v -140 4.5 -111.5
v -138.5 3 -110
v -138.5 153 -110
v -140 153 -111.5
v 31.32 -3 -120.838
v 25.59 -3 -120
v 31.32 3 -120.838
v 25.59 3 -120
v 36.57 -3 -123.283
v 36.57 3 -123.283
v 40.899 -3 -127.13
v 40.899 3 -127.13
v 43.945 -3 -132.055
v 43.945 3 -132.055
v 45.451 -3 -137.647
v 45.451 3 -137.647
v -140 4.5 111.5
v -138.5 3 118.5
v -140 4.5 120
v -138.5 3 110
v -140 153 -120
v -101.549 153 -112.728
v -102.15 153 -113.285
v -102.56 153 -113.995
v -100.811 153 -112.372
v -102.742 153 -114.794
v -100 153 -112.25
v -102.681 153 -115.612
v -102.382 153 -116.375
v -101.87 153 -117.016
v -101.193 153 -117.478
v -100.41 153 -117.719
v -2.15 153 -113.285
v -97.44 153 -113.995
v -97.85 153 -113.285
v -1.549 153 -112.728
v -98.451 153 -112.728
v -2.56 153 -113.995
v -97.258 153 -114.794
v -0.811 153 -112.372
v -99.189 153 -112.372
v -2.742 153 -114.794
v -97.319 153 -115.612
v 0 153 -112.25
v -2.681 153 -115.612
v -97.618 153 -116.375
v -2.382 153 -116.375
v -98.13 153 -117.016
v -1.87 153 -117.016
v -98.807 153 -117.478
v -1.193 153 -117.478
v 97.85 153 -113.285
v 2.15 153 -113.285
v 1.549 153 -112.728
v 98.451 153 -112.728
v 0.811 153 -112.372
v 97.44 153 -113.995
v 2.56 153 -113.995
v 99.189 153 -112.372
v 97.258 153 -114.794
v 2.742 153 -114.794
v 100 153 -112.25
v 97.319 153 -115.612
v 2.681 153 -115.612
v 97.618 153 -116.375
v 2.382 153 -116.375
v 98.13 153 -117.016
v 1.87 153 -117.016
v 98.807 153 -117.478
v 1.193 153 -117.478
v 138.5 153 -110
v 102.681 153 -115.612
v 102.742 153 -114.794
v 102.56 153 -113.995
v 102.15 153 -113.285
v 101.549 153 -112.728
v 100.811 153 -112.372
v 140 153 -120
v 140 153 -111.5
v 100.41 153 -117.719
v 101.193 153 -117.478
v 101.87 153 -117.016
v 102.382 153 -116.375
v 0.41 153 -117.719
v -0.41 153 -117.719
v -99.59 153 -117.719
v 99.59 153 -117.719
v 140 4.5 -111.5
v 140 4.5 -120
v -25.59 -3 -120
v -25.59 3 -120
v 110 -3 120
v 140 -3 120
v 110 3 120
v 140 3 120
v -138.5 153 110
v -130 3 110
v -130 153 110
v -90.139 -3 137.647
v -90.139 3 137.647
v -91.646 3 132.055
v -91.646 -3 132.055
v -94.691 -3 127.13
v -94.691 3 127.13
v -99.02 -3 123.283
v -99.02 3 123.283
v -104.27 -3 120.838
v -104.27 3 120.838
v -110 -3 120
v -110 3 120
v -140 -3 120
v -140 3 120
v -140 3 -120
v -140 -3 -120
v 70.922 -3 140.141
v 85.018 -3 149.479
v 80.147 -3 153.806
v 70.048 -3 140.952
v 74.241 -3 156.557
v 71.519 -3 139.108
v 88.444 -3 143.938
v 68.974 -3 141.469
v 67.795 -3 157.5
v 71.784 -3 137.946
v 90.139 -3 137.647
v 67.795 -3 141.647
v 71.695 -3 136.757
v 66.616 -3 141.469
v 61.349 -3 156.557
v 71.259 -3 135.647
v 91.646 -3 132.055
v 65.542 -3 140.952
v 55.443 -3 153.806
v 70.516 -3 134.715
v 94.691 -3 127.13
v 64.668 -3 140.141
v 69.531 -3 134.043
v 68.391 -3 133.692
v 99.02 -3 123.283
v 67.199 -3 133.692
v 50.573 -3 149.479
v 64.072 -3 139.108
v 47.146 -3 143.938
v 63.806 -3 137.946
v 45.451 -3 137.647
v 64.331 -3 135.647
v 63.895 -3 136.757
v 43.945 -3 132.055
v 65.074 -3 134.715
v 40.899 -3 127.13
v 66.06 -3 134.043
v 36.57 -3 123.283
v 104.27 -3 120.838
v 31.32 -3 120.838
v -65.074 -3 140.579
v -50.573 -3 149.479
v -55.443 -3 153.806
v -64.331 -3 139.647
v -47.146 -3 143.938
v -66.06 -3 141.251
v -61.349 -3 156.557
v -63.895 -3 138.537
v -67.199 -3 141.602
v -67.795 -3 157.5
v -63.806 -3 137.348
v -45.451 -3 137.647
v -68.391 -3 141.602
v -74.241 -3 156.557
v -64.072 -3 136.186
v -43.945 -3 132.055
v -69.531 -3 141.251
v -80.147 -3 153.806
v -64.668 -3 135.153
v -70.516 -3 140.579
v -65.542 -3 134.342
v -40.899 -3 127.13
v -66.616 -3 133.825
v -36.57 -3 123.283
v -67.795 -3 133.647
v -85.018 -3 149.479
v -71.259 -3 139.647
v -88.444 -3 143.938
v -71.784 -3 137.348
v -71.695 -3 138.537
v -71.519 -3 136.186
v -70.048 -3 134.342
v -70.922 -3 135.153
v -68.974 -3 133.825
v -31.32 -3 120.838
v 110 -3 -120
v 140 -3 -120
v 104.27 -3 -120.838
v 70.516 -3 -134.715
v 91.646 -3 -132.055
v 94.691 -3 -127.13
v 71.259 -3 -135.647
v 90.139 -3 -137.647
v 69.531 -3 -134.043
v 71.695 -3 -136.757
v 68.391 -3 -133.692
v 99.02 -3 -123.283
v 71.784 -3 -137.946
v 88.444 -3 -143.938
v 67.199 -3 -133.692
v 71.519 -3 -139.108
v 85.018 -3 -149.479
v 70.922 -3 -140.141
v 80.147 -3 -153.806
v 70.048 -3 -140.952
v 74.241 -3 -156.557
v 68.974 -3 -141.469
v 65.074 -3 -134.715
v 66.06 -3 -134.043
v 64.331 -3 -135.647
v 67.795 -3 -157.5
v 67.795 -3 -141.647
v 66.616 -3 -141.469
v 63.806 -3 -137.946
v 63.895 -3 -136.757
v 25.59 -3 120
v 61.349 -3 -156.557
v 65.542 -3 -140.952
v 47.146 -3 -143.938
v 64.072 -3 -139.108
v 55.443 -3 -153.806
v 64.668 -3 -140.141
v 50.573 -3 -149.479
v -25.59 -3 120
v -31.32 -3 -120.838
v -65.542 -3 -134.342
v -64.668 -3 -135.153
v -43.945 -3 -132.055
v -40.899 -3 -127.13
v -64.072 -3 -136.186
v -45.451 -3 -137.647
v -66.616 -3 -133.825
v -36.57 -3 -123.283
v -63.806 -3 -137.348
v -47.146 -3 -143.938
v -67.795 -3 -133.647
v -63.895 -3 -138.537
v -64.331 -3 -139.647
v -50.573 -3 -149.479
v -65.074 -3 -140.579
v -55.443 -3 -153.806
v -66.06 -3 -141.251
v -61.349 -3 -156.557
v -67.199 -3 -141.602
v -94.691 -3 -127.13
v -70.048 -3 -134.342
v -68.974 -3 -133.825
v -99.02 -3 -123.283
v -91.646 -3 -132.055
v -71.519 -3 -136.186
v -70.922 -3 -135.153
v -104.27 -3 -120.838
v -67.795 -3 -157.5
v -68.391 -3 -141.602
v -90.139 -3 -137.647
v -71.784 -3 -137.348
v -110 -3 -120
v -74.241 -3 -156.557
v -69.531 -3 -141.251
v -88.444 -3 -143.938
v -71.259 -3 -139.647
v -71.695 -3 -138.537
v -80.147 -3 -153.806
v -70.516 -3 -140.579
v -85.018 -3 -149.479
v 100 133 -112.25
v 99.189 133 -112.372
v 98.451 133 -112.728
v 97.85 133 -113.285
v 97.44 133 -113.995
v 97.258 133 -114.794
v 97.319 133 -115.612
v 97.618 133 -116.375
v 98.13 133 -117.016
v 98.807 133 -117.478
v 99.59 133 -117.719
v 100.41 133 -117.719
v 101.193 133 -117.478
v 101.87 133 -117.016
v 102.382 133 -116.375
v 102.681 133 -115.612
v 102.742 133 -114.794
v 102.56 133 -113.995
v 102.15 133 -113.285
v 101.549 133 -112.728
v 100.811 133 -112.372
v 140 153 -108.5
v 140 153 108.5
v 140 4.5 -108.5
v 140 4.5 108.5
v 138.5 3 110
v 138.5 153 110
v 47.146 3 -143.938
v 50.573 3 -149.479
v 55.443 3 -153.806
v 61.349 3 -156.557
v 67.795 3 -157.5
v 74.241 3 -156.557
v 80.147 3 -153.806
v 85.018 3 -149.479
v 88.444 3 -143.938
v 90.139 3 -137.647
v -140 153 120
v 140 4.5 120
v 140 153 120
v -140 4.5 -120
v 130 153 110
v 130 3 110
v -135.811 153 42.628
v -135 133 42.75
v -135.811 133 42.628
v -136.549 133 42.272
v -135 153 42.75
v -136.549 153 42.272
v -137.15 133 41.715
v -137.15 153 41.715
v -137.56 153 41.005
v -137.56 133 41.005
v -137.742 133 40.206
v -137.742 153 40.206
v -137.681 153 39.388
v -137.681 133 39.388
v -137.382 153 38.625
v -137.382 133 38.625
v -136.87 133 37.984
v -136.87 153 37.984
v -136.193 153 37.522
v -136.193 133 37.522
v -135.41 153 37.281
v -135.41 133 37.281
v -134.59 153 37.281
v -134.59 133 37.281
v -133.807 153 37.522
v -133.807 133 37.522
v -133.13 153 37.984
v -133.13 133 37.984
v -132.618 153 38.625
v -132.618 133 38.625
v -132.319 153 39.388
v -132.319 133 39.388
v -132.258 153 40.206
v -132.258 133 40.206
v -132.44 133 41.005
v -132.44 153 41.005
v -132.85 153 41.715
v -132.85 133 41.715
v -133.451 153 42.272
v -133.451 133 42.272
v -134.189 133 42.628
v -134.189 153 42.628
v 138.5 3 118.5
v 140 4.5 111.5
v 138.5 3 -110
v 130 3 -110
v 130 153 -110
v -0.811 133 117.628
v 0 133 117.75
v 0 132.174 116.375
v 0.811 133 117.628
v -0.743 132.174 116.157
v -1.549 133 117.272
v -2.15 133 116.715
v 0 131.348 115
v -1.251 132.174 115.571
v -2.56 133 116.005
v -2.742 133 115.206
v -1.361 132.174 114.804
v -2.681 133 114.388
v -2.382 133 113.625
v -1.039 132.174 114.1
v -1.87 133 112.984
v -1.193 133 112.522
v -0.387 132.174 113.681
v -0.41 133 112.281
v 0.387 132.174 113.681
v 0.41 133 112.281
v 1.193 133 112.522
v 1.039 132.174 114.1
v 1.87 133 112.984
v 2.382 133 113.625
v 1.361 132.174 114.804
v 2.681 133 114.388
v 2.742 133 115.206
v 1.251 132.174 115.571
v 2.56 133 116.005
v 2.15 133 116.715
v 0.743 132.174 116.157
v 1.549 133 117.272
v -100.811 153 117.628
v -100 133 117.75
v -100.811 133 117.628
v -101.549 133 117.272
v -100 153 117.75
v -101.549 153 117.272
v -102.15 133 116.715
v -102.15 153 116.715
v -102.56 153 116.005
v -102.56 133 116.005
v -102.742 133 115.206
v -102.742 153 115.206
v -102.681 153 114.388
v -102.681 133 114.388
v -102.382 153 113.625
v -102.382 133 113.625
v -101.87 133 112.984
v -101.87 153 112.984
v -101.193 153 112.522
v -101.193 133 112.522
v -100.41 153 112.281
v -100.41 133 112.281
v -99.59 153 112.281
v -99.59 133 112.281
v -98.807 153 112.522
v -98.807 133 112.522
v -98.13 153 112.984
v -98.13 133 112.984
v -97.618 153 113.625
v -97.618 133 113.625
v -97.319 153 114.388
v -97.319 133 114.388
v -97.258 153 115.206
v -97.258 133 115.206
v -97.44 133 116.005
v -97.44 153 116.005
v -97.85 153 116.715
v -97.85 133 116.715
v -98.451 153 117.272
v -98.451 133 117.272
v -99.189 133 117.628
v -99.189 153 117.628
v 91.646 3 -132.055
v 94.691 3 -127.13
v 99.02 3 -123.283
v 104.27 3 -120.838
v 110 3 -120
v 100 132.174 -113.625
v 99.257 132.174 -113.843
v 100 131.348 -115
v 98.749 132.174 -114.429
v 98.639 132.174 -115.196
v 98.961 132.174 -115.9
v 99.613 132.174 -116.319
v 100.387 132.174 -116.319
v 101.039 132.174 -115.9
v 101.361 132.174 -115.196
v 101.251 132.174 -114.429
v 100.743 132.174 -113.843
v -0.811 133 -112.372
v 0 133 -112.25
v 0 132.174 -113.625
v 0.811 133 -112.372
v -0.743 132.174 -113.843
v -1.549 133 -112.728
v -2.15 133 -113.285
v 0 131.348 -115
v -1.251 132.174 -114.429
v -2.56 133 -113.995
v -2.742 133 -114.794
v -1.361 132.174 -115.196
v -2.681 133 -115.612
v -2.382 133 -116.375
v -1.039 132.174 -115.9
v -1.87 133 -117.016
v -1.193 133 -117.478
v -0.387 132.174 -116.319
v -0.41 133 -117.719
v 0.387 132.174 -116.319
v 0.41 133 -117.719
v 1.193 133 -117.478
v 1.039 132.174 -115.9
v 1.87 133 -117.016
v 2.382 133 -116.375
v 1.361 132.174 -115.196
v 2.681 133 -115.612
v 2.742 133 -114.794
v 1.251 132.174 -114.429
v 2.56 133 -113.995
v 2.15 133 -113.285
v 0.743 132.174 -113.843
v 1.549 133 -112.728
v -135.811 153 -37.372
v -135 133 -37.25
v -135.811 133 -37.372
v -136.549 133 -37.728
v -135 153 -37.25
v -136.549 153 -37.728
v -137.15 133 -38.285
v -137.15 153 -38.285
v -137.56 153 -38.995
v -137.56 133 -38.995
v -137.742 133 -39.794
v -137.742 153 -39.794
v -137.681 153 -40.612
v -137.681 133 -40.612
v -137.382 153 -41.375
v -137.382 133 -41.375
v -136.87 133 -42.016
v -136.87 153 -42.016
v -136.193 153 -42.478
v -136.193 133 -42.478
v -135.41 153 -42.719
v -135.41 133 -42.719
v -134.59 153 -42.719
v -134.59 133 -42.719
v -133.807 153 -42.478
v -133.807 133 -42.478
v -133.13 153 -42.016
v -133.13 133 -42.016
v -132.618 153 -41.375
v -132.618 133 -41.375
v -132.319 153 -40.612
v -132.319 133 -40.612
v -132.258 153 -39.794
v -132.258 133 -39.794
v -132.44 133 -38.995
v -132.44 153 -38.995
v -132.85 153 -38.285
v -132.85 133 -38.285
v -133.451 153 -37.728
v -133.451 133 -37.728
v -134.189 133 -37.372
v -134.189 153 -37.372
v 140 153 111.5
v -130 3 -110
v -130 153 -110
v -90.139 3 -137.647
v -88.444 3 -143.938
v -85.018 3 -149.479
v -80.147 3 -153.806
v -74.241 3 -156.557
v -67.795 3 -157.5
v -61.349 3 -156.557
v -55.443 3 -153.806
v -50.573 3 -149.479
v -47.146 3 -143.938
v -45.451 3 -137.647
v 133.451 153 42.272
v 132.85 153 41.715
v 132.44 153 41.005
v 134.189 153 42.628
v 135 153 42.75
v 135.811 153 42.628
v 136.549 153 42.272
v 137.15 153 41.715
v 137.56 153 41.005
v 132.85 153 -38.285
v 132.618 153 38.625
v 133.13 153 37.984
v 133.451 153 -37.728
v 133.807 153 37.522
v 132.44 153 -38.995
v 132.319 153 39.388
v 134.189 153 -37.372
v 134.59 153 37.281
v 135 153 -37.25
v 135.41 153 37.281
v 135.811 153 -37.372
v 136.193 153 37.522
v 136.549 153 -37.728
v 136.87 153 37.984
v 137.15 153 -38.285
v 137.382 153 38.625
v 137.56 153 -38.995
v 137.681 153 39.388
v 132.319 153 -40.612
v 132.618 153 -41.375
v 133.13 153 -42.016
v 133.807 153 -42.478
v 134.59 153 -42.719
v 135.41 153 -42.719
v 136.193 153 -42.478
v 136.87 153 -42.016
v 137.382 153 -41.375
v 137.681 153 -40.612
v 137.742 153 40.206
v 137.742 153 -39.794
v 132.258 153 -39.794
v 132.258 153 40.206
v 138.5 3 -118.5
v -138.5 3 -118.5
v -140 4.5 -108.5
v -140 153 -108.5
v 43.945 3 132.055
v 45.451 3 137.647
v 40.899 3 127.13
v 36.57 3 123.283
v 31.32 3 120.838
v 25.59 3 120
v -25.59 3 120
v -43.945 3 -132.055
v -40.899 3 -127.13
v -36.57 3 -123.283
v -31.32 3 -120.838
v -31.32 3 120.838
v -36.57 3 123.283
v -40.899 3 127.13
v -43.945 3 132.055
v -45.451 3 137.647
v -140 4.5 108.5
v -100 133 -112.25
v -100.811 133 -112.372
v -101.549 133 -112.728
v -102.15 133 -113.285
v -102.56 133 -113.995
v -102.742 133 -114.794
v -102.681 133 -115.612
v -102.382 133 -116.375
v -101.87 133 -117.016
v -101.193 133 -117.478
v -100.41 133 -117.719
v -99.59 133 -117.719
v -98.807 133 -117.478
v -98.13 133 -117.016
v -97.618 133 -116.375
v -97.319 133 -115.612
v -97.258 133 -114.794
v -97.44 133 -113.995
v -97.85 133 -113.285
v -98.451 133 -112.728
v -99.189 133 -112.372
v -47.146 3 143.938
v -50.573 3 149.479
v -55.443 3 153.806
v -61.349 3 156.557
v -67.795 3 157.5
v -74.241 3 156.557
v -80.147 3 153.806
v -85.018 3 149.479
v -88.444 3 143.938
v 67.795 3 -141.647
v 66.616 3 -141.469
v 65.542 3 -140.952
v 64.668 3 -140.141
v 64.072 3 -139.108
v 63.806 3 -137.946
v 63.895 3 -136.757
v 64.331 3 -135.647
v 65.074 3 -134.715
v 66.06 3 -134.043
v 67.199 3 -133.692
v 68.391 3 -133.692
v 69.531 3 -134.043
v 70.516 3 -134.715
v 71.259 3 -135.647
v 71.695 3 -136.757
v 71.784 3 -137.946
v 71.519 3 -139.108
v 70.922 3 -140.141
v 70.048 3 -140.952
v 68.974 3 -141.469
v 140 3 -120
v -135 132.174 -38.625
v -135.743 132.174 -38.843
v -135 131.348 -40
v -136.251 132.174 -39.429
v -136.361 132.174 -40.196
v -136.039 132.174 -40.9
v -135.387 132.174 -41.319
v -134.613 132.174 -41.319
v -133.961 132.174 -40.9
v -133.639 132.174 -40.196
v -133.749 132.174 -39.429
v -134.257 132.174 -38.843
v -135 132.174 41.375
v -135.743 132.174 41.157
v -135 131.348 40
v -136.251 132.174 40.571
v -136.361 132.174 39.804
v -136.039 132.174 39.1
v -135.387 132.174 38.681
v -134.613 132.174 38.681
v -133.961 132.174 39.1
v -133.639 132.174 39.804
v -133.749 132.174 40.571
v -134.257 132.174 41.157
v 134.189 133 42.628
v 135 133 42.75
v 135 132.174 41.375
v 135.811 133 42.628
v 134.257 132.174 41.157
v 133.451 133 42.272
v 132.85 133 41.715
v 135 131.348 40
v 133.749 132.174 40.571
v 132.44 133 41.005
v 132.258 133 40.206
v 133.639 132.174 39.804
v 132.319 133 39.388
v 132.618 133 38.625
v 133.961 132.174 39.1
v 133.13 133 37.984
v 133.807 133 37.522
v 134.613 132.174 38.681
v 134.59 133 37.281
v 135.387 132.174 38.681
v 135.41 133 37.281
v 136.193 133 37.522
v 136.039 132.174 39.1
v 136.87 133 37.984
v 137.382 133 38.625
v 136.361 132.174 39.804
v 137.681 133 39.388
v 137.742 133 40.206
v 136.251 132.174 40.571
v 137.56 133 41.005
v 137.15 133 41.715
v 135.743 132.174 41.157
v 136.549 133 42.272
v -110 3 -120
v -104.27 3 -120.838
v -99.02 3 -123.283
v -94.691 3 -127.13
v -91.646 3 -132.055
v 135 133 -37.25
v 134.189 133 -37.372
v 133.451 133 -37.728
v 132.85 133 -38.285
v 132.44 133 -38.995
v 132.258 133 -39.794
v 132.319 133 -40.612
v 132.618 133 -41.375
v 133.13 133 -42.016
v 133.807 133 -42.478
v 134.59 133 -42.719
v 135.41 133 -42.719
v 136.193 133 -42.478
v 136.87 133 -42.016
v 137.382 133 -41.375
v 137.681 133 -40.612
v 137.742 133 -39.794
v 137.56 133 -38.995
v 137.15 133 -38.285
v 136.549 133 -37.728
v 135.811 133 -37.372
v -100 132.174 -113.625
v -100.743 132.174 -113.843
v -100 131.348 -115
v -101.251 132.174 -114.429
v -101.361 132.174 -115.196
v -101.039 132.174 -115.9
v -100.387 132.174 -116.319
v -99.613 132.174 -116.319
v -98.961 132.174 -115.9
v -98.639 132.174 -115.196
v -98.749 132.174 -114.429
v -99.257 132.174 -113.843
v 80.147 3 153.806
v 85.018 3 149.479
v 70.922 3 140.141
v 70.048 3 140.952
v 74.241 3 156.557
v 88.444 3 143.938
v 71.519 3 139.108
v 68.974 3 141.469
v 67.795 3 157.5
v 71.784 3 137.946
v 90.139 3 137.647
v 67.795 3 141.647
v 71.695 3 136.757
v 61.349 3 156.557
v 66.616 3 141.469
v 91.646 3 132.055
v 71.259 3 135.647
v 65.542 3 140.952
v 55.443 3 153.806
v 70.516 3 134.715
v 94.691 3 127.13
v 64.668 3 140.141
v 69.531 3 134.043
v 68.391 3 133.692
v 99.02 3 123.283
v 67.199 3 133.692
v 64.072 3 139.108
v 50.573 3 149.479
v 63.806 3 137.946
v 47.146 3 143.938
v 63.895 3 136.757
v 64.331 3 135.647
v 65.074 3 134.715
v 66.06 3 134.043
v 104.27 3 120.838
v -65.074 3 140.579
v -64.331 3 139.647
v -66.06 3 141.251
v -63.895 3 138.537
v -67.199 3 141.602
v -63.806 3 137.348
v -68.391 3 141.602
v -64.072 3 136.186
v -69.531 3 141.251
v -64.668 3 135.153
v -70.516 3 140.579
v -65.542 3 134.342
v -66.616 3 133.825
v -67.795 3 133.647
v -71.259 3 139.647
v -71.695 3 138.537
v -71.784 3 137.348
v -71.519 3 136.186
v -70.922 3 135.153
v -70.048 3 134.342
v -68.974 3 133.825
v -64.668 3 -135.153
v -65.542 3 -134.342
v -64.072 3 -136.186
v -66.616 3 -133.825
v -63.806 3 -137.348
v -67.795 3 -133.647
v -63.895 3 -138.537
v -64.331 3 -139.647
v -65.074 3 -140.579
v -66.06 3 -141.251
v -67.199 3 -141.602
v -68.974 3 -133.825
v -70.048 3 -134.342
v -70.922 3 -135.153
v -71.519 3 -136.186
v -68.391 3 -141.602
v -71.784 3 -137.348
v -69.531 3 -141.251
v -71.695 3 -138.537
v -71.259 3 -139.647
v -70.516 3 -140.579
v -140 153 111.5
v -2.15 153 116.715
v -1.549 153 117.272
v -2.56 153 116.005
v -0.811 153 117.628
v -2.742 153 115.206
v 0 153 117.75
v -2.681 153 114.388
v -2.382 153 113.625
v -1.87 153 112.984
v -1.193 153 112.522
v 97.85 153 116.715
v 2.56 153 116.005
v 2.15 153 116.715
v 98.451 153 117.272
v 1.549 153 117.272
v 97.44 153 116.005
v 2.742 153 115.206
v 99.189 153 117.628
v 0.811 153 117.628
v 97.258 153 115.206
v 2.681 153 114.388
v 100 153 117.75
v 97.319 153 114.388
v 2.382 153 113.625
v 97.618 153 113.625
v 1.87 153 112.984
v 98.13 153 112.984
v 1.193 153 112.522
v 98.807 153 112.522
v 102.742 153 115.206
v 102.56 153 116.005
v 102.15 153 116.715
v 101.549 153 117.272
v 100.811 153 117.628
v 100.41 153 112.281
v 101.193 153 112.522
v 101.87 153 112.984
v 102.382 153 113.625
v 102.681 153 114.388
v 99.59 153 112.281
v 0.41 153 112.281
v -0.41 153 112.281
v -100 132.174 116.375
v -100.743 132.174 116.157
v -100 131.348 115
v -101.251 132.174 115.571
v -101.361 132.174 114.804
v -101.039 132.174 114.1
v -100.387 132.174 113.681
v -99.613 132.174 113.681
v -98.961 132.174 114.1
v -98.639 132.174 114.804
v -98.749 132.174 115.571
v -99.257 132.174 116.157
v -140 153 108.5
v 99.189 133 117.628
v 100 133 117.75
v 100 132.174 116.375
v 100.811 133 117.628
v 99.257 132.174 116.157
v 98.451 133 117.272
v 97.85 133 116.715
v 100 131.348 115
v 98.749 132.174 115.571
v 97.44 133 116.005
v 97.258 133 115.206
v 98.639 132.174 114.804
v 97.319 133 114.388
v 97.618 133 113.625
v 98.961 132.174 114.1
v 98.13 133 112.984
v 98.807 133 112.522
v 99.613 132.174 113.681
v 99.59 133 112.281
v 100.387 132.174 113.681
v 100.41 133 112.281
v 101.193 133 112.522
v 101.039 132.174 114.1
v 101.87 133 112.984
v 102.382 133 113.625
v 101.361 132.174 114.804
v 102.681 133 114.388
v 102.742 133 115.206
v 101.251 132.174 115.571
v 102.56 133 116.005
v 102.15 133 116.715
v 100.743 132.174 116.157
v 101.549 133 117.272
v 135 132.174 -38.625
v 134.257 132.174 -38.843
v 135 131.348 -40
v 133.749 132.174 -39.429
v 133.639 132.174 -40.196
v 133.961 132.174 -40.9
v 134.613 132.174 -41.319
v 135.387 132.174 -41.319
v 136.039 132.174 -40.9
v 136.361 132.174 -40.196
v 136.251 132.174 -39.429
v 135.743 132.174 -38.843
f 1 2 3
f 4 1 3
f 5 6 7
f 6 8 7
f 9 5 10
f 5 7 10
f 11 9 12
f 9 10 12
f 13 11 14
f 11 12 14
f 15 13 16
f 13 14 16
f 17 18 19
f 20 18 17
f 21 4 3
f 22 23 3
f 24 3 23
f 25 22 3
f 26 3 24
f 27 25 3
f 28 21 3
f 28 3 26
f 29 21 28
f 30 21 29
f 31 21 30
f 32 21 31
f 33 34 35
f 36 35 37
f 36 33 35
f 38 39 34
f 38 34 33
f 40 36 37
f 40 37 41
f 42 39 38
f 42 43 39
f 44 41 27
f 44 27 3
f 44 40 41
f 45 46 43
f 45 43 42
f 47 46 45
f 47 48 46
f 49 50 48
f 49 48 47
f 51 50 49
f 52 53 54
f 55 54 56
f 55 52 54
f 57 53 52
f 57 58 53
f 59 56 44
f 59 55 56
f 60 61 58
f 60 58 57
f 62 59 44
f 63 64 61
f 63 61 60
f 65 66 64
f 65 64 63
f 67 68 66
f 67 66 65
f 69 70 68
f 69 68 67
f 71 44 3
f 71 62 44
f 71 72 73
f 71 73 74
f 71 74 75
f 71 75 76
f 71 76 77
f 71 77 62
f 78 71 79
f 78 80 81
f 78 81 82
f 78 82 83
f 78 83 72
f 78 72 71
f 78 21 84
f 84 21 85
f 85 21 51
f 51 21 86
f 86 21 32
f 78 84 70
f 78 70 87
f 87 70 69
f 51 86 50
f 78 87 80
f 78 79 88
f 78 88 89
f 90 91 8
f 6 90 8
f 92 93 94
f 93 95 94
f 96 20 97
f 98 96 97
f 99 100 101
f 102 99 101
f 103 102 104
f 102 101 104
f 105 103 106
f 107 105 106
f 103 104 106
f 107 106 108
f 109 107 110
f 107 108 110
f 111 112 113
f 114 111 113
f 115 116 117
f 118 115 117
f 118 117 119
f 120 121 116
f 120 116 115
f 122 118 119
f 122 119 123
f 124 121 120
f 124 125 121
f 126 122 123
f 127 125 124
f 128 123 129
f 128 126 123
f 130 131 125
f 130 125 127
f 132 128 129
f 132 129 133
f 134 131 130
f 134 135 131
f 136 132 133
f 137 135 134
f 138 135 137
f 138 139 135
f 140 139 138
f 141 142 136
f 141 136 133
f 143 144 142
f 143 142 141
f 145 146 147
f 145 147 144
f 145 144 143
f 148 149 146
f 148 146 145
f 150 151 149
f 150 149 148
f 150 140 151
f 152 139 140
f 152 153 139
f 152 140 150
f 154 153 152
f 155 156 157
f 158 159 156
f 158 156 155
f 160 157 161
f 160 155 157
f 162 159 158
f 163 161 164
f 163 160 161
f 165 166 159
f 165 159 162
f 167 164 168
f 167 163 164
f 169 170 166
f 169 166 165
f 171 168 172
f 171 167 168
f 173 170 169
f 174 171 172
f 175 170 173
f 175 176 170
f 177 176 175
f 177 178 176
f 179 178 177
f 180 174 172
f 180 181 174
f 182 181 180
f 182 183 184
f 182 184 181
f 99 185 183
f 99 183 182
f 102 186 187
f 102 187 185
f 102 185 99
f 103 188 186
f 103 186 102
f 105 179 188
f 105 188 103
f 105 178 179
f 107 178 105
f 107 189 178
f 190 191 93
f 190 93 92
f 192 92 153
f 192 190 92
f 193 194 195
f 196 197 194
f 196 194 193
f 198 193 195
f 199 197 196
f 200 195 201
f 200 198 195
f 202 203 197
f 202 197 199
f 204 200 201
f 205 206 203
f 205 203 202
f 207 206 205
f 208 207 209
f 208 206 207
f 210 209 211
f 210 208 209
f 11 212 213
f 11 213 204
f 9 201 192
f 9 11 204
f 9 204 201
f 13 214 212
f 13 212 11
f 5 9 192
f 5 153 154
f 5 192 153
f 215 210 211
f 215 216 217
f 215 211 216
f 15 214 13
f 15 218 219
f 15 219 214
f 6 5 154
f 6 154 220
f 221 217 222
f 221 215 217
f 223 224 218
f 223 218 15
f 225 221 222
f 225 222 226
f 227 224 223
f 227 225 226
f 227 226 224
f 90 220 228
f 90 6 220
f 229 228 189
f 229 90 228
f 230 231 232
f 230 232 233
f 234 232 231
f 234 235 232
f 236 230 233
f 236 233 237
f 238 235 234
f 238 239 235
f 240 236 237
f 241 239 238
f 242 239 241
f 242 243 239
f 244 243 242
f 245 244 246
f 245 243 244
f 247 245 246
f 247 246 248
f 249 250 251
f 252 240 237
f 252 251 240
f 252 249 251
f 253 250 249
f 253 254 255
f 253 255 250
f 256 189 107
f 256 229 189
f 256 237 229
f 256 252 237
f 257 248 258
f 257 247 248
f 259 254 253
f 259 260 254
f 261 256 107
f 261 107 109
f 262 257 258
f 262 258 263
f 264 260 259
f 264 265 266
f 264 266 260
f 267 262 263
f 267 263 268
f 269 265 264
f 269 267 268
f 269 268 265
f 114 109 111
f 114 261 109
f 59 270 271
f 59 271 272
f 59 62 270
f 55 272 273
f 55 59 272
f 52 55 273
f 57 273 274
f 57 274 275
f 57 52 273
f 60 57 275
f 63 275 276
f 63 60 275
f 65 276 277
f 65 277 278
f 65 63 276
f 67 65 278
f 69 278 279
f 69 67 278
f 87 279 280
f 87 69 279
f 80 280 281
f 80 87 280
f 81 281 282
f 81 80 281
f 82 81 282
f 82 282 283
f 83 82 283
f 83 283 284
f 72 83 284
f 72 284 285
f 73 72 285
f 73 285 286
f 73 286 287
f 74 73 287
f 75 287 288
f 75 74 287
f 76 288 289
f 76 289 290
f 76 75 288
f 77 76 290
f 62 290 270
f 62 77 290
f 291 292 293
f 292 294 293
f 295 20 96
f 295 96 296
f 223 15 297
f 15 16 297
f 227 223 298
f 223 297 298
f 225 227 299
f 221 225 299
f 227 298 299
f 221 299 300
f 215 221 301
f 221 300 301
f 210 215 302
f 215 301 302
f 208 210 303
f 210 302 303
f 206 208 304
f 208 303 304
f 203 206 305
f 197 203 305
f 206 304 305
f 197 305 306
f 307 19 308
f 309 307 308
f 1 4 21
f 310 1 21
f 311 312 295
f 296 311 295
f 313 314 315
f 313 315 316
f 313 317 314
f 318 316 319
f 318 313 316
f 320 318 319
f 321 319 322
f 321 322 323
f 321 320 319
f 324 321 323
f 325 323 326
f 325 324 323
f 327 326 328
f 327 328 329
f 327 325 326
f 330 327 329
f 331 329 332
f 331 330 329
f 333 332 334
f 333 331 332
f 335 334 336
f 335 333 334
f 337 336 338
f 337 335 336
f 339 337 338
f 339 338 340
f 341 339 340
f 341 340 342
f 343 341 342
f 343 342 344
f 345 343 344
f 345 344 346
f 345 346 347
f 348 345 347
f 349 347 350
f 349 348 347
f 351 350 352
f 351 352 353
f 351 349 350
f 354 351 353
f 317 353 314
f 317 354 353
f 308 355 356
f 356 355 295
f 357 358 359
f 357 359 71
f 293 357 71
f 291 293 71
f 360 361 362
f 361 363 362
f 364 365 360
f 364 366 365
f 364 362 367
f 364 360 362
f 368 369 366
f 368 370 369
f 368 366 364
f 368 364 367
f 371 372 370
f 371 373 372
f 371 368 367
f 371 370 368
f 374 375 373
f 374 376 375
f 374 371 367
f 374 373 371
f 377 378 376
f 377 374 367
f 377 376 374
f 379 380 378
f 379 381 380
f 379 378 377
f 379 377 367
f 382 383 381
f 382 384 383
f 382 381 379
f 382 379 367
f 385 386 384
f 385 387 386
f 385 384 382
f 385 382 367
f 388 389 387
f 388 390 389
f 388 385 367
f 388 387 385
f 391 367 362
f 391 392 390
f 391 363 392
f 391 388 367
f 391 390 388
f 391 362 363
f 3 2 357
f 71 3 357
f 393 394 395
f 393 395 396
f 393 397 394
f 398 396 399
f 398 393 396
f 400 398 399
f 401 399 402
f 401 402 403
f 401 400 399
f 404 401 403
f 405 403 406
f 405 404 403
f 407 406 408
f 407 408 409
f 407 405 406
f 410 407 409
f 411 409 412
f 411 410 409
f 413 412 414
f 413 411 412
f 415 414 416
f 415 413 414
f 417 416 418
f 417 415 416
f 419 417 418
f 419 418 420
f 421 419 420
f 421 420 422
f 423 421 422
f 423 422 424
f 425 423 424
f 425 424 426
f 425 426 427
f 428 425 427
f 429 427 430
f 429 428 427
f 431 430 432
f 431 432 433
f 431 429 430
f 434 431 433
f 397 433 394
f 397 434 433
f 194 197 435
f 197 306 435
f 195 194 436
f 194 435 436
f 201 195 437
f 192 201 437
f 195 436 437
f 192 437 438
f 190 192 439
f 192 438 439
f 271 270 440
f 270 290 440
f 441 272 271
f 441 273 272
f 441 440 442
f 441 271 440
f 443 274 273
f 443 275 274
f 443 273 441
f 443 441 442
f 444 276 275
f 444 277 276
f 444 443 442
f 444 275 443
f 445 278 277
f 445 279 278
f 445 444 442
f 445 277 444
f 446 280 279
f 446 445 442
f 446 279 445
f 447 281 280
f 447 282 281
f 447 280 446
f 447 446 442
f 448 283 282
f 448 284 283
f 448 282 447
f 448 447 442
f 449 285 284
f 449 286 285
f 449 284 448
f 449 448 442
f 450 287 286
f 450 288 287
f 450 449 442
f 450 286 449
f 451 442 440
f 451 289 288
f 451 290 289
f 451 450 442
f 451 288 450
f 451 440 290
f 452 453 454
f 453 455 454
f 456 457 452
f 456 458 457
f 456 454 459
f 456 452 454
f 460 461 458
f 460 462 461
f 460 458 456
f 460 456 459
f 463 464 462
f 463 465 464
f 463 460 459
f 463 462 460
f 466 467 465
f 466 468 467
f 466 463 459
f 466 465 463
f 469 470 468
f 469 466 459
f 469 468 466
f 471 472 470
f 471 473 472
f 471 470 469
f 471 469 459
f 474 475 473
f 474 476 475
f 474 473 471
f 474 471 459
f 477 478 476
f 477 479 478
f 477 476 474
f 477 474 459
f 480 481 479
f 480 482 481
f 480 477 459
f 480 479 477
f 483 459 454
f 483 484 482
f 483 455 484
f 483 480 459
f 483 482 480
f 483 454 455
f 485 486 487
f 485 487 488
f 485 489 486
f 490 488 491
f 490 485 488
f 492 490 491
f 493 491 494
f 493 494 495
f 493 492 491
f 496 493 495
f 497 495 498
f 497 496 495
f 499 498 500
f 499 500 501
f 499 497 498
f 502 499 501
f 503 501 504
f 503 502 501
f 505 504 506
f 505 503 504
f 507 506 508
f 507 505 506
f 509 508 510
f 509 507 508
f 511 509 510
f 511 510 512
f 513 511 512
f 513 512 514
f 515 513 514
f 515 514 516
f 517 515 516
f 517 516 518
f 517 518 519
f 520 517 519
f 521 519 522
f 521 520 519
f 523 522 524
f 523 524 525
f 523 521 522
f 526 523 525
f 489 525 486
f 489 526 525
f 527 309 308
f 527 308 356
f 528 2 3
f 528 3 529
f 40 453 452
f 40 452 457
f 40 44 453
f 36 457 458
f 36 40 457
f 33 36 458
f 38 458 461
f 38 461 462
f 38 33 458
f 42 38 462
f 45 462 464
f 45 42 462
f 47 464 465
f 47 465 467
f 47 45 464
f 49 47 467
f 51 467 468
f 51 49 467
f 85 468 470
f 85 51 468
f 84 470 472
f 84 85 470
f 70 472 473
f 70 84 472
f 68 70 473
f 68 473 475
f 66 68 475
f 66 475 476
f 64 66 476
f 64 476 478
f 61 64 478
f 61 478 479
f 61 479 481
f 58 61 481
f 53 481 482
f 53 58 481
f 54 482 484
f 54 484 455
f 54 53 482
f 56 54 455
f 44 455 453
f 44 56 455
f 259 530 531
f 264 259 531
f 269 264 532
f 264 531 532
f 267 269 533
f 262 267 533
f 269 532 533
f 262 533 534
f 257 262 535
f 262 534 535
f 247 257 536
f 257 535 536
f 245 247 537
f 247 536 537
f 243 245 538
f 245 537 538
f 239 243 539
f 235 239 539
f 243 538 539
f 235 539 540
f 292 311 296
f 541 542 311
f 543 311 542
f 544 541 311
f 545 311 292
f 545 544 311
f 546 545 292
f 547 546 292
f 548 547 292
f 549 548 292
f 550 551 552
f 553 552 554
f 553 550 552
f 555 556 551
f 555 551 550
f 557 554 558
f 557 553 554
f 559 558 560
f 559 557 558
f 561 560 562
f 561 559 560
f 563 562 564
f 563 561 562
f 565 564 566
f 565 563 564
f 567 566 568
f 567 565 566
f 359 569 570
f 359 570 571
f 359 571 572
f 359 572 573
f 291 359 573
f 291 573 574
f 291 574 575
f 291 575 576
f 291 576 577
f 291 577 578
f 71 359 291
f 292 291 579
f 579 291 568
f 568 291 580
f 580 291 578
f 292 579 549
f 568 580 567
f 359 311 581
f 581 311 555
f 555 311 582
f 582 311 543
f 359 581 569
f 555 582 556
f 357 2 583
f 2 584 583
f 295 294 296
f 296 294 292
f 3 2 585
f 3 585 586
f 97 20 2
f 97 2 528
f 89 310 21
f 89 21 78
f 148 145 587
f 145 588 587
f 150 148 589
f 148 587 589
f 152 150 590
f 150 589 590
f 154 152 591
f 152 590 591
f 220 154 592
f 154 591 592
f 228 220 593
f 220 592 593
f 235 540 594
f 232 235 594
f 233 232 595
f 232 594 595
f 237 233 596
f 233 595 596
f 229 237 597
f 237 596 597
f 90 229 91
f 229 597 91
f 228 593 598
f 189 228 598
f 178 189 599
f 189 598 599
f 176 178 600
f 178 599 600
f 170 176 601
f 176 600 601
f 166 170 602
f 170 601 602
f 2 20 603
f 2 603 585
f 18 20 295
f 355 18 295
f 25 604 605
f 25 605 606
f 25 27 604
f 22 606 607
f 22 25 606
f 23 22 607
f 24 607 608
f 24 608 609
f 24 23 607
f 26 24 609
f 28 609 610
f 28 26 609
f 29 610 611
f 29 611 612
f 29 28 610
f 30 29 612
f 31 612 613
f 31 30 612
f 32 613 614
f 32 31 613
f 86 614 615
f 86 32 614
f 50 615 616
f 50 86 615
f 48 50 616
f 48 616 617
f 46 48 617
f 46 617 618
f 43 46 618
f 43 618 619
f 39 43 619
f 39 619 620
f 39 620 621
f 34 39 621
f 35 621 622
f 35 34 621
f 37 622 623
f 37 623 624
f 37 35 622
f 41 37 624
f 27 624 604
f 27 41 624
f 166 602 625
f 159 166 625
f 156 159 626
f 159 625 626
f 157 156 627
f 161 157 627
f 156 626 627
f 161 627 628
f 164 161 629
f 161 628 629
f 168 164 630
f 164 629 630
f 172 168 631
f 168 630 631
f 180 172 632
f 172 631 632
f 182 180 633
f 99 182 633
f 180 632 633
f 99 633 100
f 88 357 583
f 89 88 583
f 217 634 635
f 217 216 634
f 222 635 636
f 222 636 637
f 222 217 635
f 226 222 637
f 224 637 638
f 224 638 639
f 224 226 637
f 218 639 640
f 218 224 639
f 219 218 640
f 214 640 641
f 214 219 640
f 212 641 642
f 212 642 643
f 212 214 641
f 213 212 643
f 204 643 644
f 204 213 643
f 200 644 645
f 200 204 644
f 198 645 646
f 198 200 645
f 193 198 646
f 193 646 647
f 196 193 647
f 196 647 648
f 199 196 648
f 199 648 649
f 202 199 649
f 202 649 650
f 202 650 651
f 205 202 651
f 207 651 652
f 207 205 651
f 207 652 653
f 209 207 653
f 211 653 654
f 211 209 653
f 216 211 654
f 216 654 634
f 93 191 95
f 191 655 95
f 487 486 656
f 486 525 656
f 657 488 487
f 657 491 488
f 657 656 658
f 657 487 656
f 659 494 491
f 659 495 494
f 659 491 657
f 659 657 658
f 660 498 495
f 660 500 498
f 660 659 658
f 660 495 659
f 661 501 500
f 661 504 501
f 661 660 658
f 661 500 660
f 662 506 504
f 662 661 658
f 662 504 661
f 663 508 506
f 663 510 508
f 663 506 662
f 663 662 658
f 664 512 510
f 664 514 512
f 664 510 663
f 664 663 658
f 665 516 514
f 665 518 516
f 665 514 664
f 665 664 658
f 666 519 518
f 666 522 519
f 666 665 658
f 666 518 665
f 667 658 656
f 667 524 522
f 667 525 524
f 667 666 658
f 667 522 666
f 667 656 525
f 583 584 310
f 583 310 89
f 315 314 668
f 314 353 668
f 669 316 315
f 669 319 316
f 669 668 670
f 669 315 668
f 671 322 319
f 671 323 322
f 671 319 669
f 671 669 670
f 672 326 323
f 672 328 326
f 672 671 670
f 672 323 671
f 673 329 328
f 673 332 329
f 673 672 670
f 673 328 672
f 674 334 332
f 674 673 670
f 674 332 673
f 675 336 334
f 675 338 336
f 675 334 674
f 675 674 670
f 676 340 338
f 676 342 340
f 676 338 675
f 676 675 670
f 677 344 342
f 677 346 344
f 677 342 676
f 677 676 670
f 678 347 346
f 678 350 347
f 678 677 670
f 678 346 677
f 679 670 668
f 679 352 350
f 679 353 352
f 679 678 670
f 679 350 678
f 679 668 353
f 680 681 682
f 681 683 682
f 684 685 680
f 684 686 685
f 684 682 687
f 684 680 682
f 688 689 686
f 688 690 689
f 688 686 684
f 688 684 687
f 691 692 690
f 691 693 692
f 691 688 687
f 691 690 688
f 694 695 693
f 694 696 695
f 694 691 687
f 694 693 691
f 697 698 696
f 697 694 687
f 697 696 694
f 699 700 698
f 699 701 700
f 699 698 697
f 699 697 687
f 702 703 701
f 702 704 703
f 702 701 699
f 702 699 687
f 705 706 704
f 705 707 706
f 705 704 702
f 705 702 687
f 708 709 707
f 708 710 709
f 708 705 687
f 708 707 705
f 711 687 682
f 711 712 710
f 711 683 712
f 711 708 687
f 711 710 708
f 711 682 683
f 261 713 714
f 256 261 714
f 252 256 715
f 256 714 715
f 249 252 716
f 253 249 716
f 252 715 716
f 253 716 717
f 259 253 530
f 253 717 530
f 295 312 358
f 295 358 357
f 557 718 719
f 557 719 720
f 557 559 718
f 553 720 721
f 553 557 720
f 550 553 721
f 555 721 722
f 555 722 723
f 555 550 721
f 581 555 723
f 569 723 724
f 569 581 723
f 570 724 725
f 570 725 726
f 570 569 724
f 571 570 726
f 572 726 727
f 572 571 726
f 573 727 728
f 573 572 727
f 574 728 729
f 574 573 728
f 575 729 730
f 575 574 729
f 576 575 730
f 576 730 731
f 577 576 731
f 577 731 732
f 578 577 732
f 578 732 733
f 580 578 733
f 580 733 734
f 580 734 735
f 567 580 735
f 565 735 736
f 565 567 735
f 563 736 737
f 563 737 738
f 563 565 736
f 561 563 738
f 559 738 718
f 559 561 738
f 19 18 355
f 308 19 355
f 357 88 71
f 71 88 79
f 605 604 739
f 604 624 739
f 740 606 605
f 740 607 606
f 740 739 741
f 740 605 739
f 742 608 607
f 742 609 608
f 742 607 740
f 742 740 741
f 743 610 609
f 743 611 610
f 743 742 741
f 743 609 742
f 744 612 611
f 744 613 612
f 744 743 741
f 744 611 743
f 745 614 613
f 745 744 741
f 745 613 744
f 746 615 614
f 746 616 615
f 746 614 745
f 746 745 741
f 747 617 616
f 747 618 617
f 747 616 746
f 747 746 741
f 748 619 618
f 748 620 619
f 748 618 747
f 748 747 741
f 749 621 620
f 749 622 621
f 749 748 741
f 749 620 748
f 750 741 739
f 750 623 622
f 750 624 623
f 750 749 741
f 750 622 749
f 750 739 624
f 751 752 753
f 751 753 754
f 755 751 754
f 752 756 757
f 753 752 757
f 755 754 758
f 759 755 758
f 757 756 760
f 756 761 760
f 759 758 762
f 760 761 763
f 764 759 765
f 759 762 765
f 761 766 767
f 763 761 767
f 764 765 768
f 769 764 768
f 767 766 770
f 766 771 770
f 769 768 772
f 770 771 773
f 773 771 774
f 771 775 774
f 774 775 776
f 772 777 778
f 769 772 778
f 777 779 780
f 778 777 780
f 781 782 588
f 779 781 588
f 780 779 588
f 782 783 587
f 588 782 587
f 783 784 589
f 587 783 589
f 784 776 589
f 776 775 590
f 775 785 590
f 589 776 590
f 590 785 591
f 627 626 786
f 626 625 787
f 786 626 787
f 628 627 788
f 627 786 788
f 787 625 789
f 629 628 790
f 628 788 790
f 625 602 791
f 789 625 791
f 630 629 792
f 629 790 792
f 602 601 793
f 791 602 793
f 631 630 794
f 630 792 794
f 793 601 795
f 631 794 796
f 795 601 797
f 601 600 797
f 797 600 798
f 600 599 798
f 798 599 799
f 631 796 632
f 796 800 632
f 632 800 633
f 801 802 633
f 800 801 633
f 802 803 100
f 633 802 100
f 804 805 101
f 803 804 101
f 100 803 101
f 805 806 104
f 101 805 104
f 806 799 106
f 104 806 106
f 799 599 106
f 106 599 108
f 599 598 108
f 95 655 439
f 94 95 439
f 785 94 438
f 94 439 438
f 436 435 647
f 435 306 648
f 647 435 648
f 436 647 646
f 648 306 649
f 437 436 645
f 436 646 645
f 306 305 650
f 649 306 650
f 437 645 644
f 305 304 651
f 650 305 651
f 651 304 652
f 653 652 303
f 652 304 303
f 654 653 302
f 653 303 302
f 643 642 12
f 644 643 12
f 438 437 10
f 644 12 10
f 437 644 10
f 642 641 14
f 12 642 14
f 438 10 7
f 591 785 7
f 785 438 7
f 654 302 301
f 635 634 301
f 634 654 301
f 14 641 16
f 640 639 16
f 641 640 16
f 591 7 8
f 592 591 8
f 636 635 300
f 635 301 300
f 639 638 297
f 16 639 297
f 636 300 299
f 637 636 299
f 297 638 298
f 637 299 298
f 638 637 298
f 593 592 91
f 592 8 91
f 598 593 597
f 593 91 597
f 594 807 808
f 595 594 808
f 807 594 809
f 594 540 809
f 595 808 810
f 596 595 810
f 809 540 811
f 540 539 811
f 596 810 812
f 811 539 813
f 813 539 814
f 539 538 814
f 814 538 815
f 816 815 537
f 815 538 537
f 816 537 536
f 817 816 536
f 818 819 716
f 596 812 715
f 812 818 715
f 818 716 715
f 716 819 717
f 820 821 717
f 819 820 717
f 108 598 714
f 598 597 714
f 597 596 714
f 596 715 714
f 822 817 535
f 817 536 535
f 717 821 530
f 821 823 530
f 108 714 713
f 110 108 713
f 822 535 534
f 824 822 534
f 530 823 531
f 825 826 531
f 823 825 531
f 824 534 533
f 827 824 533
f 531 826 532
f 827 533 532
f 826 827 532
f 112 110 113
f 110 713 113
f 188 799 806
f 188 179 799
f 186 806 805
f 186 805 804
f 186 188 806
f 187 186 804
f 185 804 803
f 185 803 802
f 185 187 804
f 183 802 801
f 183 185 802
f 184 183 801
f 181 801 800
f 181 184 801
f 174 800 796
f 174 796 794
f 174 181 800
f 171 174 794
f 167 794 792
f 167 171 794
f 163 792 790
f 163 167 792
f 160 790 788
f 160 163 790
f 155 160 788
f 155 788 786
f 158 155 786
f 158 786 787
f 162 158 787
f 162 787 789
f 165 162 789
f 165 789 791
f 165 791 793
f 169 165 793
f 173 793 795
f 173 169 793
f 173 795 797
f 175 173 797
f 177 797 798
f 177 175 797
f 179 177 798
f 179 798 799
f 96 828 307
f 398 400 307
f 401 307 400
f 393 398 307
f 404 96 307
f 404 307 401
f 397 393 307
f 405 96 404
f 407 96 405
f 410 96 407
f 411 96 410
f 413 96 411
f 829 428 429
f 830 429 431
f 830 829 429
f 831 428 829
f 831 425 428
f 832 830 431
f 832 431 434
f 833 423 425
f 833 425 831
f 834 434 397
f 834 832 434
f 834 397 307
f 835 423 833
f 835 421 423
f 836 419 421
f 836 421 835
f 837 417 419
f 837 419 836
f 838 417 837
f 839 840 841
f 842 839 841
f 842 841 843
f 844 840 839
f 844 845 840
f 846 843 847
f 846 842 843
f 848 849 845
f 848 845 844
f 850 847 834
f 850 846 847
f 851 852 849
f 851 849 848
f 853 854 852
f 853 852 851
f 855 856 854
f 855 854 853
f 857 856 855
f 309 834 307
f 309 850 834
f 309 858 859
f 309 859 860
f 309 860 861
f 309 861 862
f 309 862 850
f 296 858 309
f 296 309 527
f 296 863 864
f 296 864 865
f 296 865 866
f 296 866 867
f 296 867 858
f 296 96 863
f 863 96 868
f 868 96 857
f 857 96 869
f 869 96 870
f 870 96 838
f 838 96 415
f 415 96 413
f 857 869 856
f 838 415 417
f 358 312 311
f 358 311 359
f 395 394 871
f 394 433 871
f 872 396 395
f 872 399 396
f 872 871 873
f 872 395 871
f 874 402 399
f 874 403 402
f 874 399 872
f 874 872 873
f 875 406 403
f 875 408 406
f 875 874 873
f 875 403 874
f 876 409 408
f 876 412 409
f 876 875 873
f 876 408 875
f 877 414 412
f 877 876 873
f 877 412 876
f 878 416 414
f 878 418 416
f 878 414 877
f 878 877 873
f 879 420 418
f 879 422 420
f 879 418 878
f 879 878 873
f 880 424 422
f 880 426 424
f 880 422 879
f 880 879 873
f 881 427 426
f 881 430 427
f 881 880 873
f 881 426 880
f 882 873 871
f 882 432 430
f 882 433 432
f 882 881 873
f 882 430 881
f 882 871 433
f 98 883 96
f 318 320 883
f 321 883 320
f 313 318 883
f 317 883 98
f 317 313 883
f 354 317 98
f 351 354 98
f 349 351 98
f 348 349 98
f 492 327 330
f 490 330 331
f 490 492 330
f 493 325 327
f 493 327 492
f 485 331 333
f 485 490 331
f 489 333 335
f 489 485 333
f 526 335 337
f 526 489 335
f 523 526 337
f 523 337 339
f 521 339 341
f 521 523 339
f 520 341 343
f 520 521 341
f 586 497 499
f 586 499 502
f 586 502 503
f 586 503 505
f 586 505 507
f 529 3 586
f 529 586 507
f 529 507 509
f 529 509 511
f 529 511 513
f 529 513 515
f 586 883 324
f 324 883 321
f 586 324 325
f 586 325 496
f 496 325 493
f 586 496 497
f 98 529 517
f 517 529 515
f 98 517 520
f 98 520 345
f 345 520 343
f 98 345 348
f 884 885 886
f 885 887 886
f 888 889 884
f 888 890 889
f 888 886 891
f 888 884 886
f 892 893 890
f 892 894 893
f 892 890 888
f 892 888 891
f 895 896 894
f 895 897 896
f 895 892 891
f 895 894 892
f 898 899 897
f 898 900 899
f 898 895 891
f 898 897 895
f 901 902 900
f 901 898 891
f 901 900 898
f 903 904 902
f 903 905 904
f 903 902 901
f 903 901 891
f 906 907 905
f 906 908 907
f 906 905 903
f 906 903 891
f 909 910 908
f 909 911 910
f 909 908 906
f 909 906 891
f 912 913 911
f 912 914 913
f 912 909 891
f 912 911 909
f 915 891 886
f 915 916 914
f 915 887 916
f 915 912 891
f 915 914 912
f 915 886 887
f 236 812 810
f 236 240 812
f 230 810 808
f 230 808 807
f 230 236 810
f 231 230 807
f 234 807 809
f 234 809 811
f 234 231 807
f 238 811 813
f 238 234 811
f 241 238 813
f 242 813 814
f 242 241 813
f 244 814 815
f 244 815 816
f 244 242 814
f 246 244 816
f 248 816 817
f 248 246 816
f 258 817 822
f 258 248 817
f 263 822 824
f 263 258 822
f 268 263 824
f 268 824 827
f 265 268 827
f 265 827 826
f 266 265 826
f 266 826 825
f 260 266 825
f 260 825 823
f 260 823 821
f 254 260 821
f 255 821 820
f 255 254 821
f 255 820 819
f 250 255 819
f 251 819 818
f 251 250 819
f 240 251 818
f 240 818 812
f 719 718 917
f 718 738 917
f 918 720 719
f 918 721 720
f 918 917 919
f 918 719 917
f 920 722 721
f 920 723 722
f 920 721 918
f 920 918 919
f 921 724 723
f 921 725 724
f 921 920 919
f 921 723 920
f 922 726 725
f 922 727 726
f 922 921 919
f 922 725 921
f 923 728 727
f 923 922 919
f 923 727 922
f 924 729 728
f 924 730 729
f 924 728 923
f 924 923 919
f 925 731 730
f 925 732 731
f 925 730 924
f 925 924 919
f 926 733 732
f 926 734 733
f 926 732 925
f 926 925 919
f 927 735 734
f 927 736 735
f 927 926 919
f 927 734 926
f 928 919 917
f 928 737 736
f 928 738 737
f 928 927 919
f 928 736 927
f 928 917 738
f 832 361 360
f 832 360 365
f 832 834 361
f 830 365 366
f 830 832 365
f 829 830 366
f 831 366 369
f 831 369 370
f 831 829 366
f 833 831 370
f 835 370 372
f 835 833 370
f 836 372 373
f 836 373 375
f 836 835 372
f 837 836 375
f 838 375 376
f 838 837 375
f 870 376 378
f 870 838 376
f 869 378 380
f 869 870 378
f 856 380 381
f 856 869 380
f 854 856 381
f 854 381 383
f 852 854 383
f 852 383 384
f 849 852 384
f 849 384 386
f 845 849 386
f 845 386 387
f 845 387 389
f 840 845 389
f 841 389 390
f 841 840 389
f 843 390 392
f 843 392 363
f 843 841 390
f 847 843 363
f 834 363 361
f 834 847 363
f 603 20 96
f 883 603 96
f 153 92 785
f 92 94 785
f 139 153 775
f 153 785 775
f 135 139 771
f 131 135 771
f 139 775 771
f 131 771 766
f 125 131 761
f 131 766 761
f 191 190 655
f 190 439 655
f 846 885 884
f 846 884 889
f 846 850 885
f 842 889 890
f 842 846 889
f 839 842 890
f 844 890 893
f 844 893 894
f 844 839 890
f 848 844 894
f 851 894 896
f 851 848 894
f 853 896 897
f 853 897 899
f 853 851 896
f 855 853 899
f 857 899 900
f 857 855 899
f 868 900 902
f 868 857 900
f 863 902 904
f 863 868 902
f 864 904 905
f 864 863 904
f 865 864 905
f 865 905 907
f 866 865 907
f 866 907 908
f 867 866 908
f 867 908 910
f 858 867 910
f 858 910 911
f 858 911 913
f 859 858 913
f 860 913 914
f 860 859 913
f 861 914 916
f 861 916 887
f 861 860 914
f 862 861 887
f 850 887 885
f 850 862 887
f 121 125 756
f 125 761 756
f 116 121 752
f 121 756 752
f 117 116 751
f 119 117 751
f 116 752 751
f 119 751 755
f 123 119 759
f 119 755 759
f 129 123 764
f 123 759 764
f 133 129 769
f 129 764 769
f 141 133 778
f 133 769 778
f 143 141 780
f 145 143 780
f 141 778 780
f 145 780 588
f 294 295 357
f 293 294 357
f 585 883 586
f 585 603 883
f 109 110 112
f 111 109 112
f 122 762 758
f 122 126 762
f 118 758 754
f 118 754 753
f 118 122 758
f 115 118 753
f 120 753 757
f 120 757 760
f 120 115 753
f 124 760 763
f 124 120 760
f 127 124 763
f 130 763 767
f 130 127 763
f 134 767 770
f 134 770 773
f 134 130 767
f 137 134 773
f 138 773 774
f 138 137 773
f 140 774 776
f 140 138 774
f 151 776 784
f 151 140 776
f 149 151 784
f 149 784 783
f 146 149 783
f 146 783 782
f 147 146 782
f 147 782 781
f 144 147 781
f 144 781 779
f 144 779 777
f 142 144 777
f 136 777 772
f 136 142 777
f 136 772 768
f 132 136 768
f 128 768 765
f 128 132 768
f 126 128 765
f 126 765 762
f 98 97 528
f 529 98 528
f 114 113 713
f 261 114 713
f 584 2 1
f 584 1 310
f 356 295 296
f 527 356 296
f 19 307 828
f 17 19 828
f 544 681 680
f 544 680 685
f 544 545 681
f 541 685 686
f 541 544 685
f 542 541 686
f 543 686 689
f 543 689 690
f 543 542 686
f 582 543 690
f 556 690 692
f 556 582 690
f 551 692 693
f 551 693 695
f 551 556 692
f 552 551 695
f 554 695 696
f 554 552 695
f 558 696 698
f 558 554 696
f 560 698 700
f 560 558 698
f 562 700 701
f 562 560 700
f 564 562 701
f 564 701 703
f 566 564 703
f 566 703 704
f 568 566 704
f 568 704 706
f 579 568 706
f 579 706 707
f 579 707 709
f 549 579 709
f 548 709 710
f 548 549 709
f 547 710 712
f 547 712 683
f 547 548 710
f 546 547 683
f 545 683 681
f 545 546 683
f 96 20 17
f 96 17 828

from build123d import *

# Parameters (mm, degrees)
CROQUIS1_R                             = 4
SALIENTE_EXTRUIR1_DEPTH                = 3
CROQUIS2_W                             = 280
CROQUIS2_H                             = 10
SALIENTE_EXTRUIR2_DEPTH                = 150
SALIENTE_EXTRUIR2_2_DEPTH              = 150
CROQUIS3_W                             = 10
CROQUIS3_H                             = 220
SALIENTE_EXTRUIR3_DEPTH                = 150
SALIENTE_EXTRUIR3_2_DEPTH              = 150
CHAFL_N1_SIZE                          = 1.5
CHAFL_N2_SIZE                          = 1.5
CHAFL_N3_SIZE                          = 1.5
CHAFL_N4_SIZE                          = 1.5
TALADRO_DE_MARGEN_PARA_M51_AT_2_COUNT  = 2
TALADRO_DE_MARGEN_PARA_M51_AT_2_PITCH  = 80
TALADRO_DE_MARGEN_PARA_M51_AT_3_COUNT  = 2
TALADRO_DE_MARGEN_PARA_M51_AT_3_PITCH  = 82.764726786
TALADRO_DE_MARGEN_PARA_M51_AT_4_COUNT  = 2
TALADRO_DE_MARGEN_PARA_M51_AT_4_PITCH  = 246.677927671
TALADRO_DE_MARGEN_PARA_M51_AT_5_COUNT  = 2
TALADRO_DE_MARGEN_PARA_M51_AT_5_PITCH  = 270
TALADRO_DE_MARGEN_PARA_M51_AT_6_COUNT  = 2
TALADRO_DE_MARGEN_PARA_M51_AT_6_PITCH  = 281.602556807
TALADRO_DE_MARGEN_PARA_M51_AT_7_COUNT  = 2
TALADRO_DE_MARGEN_PARA_M51_AT_7_PITCH  = 281.513765205
TALADRO_DE_MARGEN_PARA_M51_AT_8_COUNT  = 2
TALADRO_DE_MARGEN_PARA_M51_AT_8_PITCH  = 158.902485821
TALADRO_DE_MARGEN_PARA_M51_AT_9_COUNT  = 2
TALADRO_DE_MARGEN_PARA_M51_AT_9_PITCH  = 154.434452115
TALADRO_DE_MARGEN_PARA_M51_AT_10_COUNT = 2
TALADRO_DE_MARGEN_PARA_M51_AT_10_PITCH = 205.548047911


with BuildPart() as part:
    # Croquis1 → Saliente-Extruir1 (new, symmetric)
    with BuildSketch(Plane(origin=(0, 0, 0), x_dir=(1, 0, 0), z_dir=(0, 1, 0))):
        with BuildLine():
            Line((-25.590284919, 120), (25.590284919, 120))
            ThreePointArc((25.590284919, 120), (38.874508202, 125.049099968), (45.45139435, 137.647058824))
            ThreePointArc((45.45139435, 137.647058824), (67.79514246, 157.5), (90.138890569, 137.647058824))
            ThreePointArc((90.138890569, 137.647058824), (96.715776717, 125.049099968), (110, 120))
            Line((110, 120), (140, 120))
            Line((140, 120), (140, -120))
            Line((140, -120), (110, -120))
            ThreePointArc((110, -120), (96.715776717, -125.049099968), (90.138890569, -137.647058824))
            ThreePointArc((90.138890569, -137.647058824), (67.79514246, -157.5), (45.45139435, -137.647058824))
            ThreePointArc((45.45139435, -137.647058824), (38.874508202, -125.049099968), (25.590284919, -120))
            Line((25.590284919, -120), (-25.590284919, -120))
            ThreePointArc((-25.590284919, -120), (-38.874508202, -125.049099968), (-45.45139435, -137.647058824))
            ThreePointArc((-45.45139435, -137.647058824), (-67.79514246, -157.5), (-90.138890569, -137.647058824))
            ThreePointArc((-90.138890569, -137.647058824), (-96.715776717, -125.049099968), (-110, -120))
            Line((-110, -120), (-140, -120))
            Line((-140, -120), (-140, 120))
            Line((-140, 120), (-110, 120))
            ThreePointArc((-110, 120), (-96.715776717, 125.049099968), (-90.138890569, 137.647058824))
            ThreePointArc((-90.138890569, 137.647058824), (-67.79514246, 157.5), (-45.45139435, 137.647058824))
            ThreePointArc((-45.45139435, 137.647058824), (-38.874508202, 125.049099968), (-25.590284919, 120))
        make_face()
        with Locations(Location((-67.79514246, 137.647058824, 0), (0, 0, 270))):
            Circle(CROQUIS1_R, mode=Mode.SUBTRACT)
        with Locations(Location((67.79514246, 137.647058824, 0), (0, 0, 90))):
            Circle(CROQUIS1_R, mode=Mode.SUBTRACT)
        with Locations(Location((67.79514246, -137.647058824, 0), (0, 0, 270))):
            Circle(CROQUIS1_R, mode=Mode.SUBTRACT)
        with Locations(Location((-67.79514246, -137.647058824, 0), (0, 0, 90))):
            Circle(CROQUIS1_R, mode=Mode.SUBTRACT)
    extrude(amount=SALIENTE_EXTRUIR1_DEPTH, both=True)


with BuildPart() as body_2:
    # Croquis2 → Saliente-Extruir2 (new body)
    with BuildSketch(Plane(origin=(0, 3, 0), x_dir=(1, 0, 0), z_dir=(0, 1, 0))):
        with Locations((0, 115)):
            Rectangle(CROQUIS2_W, CROQUIS2_H)
    extrude(amount=SALIENTE_EXTRUIR2_DEPTH)

    # Chaflán2
    chafl_n2_edges = [body_2.edges().sort_by_distance(p)[0] for p in [
        (0, 3, -120),
        (140, 3, -115),
        (-140, 3, -115),
        (140, 78, -110),
        (-140, 78, -110),
    ]]
    chamfer(chafl_n2_edges, length=CHAFL_N2_SIZE)


with BuildPart() as body_3:
    # Croquis2 → Saliente-Extruir2 2 (new body)
    with BuildSketch(Plane(origin=(0, 3, 0), x_dir=(1, 0, 0), z_dir=(0, 1, 0))):
        with Locations((0, -115)):
            Rectangle(CROQUIS2_W, CROQUIS2_H)
    extrude(amount=SALIENTE_EXTRUIR2_2_DEPTH)

    # Chaflán3
    chafl_n3_edges = [body_3.edges().sort_by_distance(p)[0] for p in [
        (140, 3, 115),
        (0, 3, 120),
        (-140, 3, 115),
        (-140, 78, 110),
        (140, 78, 110),
    ]]
    chamfer(chafl_n3_edges, length=CHAFL_N3_SIZE)


with BuildPart() as body_4:
    # Croquis3 → Saliente-Extruir3 (new body)
    with BuildSketch(Plane(origin=(0, 3, 0), x_dir=(1, 0, 0), z_dir=(0, 1, 0))):
        with Locations((-135, 0)):
            Rectangle(CROQUIS3_W, CROQUIS3_H)
    extrude(amount=SALIENTE_EXTRUIR3_DEPTH)

    # Chaflán1
    chafl_n1_edges = [body_4.edges().sort_by_distance(p)[0] for p in [
        (-140, 3, 0),
        (-140, 78, -110),
        (-140, 78, 110),
    ]]
    chamfer(chafl_n1_edges, length=CHAFL_N1_SIZE)

    # Croquis5 → Taladro de margen para M51 (revolve, cut)
    with BuildSketch(Plane(origin=(-135, 153, -40), x_dir=(0, 0, 1), z_dir=(1, 0, 0))):
        Polygon((0, 0), (0, 21.652366702), (2.75, 20), (2.75, 0), align=None)
    taladro_de_margen_para_m51 = revolve(axis=Axis((-135, 159.35, -40), (0, -1, 0)), mode=Mode.SUBTRACT)

    # Taladro de margen para M51 at 2: Taladro de margen para M51 ×2
    with Locations(*[(0, 0, i * TALADRO_DE_MARGEN_PARA_M51_AT_2_PITCH) for i in range(1, TALADRO_DE_MARGEN_PARA_M51_AT_2_COUNT)]):
        add(taladro_de_margen_para_m51, mode=Mode.SUBTRACT)


with BuildPart() as body_5:
    # Croquis3 → Saliente-Extruir3 2 (new body)
    with BuildSketch(Plane(origin=(0, 3, 0), x_dir=(1, 0, 0), z_dir=(0, 1, 0))):
        with Locations((135, 0)):
            Rectangle(CROQUIS3_W, CROQUIS3_H)
    extrude(amount=SALIENTE_EXTRUIR3_2_DEPTH)

    # Chaflán4
    chafl_n4_edges = [body_5.edges().sort_by_distance(p)[0] for p in [
        (140, 3, 0),
        (140, 78, 110),
        (140, 78, -110),
    ]]
    chamfer(chafl_n4_edges, length=CHAFL_N4_SIZE)

    # Taladro de margen para M51 at 5: Taladro de margen para M51 ×2
    with Locations(*[(i * TALADRO_DE_MARGEN_PARA_M51_AT_5_PITCH, 0, 0) for i in range(1, TALADRO_DE_MARGEN_PARA_M51_AT_5_COUNT)]):
        add(taladro_de_margen_para_m51, mode=Mode.SUBTRACT)

    # Taladro de margen para M51 at 6: Taladro de margen para M51 ×2
    with Locations(*[Vector(0.9587981127083872, 0, 0.284088329691374) * (i * TALADRO_DE_MARGEN_PARA_M51_AT_6_PITCH) for i in range(1, TALADRO_DE_MARGEN_PARA_M51_AT_6_COUNT)]):
        add(taladro_de_margen_para_m51, mode=Mode.SUBTRACT)


with BuildPart() as body_2_1:
    add(body_2.part)

    # Taladro de margen para M51 at 3: Taladro de margen para M51 ×2
    with Locations(*[Vector(0.42288546533112364, 0, -0.9061831399952656) * (i * TALADRO_DE_MARGEN_PARA_M51_AT_3_PITCH) for i in range(1, TALADRO_DE_MARGEN_PARA_M51_AT_3_COUNT)]):
        add(taladro_de_margen_para_m51, mode=Mode.SUBTRACT)

    # Taladro de margen para M51 at 4: Taladro de margen para M51 ×2
    with Locations(*[Vector(0.9526592112186827, 0, -0.3040401737931967) * (i * TALADRO_DE_MARGEN_PARA_M51_AT_4_PITCH) for i in range(1, TALADRO_DE_MARGEN_PARA_M51_AT_4_COUNT)]):
        add(taladro_de_margen_para_m51, mode=Mode.SUBTRACT)

    # Taladro de margen para M51 at 9: Taladro de margen para M51 ×2
    with Locations(*[Vector(0.8741572761215378, 0, -0.4856429311786321) * (i * TALADRO_DE_MARGEN_PARA_M51_AT_9_PITCH) for i in range(1, TALADRO_DE_MARGEN_PARA_M51_AT_9_COUNT)]):
        add(taladro_de_margen_para_m51, mode=Mode.SUBTRACT)


with BuildPart() as body_3_1:
    add(body_3.part)

    # Taladro de margen para M51 at 7: Taladro de margen para M51 ×2
    with Locations(*[Vector(0.8347726791573309, 0, 0.5505947458271755) * (i * TALADRO_DE_MARGEN_PARA_M51_AT_7_PITCH) for i in range(1, TALADRO_DE_MARGEN_PARA_M51_AT_7_COUNT)]):
        add(taladro_de_margen_para_m51, mode=Mode.SUBTRACT)

    # Taladro de margen para M51 at 8: Taladro de margen para M51 ×2
    with Locations(*[Vector(0.22026087143464346, 0, 0.9754410020677066) * (i * TALADRO_DE_MARGEN_PARA_M51_AT_8_PITCH) for i in range(1, TALADRO_DE_MARGEN_PARA_M51_AT_8_COUNT)]):
        add(taladro_de_margen_para_m51, mode=Mode.SUBTRACT)

    # Taladro de margen para M51 at 10: Taladro de margen para M51 ×2
    with Locations(*[Vector(0.6567807448042018, 0, 0.754081595886306) * (i * TALADRO_DE_MARGEN_PARA_M51_AT_10_PITCH) for i in range(1, TALADRO_DE_MARGEN_PARA_M51_AT_10_COUNT)]):
        add(taladro_de_margen_para_m51, mode=Mode.SUBTRACT)


solid = Compound([part.part, body_4.part, body_5.part, body_2_1.part, body_3_1.part])
